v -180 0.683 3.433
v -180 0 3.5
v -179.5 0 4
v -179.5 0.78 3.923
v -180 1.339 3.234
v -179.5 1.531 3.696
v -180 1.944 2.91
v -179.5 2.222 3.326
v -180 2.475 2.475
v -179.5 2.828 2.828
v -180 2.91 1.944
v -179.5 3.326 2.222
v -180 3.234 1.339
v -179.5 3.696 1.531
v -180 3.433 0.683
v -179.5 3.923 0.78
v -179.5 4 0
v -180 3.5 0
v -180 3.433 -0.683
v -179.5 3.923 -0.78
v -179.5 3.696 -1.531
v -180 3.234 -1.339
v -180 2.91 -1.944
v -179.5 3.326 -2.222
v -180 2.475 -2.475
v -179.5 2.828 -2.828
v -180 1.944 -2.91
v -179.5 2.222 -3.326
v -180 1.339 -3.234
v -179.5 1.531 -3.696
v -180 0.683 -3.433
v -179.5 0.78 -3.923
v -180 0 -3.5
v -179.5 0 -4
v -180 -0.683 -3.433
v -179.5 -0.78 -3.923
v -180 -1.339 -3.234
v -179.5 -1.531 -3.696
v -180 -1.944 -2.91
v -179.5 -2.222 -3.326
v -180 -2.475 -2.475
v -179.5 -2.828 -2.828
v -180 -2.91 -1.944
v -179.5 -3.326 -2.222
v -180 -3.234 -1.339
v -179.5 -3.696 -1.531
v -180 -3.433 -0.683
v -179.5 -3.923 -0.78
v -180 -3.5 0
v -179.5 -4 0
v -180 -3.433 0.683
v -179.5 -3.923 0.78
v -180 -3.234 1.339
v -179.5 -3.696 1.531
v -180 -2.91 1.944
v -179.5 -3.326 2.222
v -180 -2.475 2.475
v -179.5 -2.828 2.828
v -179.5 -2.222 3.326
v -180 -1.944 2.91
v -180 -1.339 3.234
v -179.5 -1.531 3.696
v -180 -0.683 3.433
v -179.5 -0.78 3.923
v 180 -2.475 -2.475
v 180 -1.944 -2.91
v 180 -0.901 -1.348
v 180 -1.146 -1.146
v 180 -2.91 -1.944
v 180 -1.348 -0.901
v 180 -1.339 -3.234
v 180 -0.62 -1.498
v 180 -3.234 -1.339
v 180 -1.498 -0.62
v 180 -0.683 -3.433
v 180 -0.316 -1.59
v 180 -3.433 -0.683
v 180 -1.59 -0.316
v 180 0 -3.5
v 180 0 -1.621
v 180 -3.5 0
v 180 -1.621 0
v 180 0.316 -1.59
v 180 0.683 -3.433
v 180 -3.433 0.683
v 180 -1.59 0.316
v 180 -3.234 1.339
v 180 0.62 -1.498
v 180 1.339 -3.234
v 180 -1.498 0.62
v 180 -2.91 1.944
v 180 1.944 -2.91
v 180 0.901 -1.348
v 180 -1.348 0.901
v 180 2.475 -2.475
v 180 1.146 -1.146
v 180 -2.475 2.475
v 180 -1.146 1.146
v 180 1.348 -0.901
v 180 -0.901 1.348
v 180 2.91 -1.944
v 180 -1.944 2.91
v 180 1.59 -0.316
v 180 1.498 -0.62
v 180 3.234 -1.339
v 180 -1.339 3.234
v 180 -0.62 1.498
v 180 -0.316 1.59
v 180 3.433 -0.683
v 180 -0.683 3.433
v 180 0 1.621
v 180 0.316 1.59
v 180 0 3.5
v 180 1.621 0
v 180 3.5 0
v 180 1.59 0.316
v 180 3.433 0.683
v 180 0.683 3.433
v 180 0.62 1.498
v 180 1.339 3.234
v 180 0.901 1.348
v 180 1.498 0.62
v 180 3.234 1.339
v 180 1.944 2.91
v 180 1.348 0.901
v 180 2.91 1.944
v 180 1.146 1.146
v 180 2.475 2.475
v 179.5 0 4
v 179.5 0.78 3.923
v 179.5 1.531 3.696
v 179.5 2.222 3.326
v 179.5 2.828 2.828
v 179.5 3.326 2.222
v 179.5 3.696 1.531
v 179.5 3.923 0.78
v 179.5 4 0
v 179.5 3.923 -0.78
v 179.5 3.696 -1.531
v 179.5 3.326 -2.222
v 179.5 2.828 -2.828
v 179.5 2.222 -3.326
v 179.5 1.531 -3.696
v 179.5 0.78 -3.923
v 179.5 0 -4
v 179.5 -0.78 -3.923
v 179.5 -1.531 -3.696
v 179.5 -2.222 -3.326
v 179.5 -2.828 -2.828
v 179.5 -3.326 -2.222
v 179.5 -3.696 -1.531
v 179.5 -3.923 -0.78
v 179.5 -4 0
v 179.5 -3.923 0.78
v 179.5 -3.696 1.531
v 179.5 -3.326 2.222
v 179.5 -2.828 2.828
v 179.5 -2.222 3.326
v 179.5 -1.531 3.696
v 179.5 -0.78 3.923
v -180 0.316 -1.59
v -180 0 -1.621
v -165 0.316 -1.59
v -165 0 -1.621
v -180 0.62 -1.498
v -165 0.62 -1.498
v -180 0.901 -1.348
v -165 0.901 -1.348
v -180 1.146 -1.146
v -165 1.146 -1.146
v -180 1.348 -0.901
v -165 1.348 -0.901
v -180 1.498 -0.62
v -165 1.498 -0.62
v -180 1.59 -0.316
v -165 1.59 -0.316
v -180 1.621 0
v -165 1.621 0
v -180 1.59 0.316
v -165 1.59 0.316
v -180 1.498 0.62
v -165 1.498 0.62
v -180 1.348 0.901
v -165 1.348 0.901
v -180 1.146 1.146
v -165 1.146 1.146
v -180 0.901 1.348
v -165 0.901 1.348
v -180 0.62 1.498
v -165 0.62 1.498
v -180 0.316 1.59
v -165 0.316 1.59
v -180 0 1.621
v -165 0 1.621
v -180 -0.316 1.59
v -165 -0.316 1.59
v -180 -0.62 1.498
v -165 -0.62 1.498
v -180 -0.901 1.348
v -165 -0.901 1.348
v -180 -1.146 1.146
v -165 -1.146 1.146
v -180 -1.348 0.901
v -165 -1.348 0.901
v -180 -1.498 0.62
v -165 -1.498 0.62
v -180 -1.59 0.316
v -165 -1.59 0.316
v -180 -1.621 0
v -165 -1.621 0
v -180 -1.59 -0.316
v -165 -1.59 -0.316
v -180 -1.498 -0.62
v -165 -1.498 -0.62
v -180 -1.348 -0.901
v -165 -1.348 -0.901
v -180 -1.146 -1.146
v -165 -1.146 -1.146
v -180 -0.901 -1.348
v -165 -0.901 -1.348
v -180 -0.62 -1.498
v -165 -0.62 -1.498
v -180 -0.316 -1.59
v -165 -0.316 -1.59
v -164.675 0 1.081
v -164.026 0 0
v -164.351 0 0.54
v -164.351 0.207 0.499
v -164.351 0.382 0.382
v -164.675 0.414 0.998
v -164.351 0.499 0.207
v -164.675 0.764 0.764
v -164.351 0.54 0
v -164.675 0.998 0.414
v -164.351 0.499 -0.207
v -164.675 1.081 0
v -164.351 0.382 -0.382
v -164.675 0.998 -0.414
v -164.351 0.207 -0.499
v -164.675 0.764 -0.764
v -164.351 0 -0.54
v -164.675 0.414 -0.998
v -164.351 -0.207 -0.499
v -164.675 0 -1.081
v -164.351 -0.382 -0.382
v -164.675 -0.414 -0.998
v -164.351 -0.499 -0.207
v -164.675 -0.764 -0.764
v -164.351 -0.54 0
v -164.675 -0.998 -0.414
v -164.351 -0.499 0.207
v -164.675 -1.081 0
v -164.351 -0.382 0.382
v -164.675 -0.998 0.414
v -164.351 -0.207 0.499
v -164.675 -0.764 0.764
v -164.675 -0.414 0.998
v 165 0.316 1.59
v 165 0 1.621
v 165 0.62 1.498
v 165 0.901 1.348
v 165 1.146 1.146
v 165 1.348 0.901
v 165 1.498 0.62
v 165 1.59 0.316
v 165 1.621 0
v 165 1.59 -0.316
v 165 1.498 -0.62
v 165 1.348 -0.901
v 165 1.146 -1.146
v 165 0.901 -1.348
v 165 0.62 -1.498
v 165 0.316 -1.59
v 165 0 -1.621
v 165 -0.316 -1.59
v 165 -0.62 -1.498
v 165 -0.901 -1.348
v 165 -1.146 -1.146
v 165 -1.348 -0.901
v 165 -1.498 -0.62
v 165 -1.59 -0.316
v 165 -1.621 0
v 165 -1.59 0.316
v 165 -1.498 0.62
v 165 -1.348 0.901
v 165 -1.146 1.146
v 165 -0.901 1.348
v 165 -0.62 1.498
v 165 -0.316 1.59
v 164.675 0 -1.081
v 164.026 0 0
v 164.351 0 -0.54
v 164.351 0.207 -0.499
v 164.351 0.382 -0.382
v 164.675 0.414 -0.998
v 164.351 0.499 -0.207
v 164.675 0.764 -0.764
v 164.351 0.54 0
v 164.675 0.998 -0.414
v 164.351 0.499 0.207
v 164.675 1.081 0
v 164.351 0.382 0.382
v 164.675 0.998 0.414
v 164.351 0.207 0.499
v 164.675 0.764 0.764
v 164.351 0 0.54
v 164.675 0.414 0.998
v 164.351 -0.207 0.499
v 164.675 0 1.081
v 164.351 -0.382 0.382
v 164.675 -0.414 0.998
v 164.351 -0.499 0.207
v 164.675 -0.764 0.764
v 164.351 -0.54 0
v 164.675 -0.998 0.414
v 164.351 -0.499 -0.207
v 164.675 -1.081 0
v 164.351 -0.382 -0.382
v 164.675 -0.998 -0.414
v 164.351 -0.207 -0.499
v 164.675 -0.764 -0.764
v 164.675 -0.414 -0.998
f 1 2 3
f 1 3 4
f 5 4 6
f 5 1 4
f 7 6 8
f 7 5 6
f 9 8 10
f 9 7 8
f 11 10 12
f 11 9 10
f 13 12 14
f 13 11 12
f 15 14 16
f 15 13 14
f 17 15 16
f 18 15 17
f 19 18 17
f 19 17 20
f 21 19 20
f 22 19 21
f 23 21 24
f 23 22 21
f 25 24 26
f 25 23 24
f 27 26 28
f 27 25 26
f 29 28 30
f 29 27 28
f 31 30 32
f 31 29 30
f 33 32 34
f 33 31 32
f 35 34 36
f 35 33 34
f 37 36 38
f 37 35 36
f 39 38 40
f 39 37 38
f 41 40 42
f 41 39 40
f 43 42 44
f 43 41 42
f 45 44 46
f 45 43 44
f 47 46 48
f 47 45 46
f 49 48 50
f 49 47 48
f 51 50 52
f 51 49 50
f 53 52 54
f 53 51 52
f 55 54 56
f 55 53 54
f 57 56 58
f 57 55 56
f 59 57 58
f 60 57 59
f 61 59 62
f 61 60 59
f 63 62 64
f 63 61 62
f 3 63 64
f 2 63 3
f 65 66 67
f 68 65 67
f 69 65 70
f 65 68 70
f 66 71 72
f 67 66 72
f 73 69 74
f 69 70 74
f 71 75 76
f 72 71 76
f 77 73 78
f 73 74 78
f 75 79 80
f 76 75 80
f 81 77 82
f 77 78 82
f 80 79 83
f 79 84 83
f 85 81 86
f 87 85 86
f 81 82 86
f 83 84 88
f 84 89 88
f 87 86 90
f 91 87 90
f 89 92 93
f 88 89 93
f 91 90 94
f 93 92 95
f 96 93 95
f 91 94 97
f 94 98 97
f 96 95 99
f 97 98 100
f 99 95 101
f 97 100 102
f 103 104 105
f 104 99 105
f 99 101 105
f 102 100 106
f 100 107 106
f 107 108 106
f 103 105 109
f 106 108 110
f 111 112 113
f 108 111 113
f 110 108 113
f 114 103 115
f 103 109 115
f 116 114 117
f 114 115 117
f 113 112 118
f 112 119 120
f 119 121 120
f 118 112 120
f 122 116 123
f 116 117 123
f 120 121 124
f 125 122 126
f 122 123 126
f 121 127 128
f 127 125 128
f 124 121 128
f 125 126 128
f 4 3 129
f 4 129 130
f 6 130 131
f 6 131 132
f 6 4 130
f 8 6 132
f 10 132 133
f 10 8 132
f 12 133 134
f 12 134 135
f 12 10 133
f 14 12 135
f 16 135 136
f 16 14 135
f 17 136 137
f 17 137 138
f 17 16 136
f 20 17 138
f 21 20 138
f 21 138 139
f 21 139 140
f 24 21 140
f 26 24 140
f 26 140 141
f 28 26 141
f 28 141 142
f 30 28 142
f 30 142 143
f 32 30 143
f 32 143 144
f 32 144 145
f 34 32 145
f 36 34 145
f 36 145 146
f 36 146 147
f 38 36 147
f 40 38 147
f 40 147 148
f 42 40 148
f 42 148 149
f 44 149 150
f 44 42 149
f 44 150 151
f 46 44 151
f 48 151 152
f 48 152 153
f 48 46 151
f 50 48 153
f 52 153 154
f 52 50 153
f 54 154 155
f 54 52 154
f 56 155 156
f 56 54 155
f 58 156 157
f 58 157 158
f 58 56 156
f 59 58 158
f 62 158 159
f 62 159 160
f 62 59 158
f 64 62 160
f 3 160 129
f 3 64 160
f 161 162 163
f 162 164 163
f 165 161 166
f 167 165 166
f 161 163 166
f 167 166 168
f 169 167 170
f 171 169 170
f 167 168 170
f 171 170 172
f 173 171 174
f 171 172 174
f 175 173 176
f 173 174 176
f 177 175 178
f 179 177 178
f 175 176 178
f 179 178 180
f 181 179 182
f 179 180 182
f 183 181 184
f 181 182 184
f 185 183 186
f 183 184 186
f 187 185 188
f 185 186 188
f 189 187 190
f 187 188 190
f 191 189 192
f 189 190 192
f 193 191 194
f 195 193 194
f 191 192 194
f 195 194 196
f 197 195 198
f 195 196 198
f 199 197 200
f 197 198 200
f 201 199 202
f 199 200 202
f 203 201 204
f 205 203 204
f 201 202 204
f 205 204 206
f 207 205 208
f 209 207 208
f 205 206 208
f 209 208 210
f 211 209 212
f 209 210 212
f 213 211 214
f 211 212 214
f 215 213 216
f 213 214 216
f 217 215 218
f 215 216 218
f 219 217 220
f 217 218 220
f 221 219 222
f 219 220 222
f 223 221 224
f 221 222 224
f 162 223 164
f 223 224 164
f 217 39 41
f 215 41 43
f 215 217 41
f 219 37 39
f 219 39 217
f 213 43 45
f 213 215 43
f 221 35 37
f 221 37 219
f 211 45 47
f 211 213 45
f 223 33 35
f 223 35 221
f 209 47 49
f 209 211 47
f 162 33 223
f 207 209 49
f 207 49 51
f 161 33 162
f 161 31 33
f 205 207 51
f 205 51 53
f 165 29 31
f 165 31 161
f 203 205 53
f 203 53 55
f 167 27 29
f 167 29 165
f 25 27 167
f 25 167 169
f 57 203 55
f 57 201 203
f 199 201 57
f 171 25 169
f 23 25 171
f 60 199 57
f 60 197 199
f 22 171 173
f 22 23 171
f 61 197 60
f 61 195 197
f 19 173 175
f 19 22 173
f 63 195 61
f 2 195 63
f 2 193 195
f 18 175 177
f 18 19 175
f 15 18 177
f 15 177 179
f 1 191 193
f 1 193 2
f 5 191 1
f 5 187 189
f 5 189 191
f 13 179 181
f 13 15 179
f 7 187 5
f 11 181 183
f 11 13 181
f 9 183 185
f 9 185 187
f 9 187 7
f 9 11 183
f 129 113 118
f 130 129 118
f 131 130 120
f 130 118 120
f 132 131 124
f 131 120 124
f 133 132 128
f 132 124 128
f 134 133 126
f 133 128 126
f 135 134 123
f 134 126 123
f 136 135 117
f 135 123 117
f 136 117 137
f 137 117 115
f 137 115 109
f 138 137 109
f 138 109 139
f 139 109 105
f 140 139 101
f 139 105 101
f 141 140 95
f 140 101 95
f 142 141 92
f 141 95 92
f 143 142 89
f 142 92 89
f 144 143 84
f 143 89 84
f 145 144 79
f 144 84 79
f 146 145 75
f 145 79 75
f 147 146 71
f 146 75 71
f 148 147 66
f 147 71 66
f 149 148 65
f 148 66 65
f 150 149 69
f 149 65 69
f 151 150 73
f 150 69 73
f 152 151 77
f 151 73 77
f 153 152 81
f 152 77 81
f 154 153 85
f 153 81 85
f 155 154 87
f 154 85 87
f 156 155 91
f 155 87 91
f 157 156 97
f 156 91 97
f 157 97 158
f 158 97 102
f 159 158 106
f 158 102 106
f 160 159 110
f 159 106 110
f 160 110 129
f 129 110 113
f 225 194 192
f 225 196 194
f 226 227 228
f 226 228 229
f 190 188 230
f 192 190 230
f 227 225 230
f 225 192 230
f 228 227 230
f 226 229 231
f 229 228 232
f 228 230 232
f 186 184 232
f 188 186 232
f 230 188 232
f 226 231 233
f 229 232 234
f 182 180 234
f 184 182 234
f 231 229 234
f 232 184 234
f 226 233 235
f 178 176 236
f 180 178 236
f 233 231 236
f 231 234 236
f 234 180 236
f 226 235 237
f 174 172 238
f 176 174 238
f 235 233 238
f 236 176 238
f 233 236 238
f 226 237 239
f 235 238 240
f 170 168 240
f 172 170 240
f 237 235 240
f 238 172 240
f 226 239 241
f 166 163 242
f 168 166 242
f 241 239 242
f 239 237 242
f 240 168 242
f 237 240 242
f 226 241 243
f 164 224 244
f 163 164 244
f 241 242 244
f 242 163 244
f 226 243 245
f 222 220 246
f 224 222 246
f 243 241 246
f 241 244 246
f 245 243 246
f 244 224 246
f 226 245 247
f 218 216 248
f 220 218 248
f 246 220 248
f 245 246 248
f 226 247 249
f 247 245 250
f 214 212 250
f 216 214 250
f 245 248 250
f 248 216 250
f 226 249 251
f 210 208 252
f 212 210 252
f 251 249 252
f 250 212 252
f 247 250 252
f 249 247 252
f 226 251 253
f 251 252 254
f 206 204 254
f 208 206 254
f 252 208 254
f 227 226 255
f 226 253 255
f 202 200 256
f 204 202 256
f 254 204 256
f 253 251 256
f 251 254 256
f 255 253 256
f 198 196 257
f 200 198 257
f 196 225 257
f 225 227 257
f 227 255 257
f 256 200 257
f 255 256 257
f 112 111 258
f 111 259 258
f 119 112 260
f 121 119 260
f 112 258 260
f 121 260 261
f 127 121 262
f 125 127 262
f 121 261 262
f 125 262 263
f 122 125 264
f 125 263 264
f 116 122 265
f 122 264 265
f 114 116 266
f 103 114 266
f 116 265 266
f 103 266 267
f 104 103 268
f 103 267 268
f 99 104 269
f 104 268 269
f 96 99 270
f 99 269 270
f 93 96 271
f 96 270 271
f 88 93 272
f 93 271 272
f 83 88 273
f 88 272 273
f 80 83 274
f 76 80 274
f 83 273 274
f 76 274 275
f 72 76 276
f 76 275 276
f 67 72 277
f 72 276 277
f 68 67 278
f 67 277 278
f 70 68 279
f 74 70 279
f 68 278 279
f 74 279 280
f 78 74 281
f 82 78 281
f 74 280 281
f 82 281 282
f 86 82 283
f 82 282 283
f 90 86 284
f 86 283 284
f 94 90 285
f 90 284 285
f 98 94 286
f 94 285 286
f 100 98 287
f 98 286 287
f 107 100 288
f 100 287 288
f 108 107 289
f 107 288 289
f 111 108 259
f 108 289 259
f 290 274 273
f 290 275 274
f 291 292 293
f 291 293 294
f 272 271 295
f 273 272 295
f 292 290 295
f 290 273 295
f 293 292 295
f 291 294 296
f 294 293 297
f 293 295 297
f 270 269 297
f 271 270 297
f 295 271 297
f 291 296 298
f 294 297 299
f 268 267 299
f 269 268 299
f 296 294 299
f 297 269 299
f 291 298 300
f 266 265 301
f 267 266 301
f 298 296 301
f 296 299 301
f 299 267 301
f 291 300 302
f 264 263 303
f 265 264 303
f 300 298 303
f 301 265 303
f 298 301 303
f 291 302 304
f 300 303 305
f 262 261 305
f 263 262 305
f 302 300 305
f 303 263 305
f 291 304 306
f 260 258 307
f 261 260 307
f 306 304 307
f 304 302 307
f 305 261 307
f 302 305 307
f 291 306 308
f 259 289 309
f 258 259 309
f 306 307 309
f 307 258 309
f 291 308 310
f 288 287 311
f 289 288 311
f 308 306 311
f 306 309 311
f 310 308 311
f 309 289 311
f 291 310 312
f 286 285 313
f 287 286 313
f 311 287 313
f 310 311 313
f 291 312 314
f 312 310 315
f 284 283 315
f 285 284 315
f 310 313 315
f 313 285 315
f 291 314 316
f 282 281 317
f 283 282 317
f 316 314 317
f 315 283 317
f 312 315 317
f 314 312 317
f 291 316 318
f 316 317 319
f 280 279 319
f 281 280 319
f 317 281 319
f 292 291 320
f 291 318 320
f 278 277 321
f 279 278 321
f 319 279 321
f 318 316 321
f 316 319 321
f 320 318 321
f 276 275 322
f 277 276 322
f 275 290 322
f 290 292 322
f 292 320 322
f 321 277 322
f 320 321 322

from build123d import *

# Parameters (mm, degrees)
SKETCH1_R                = 4
BOSS_EXTRUDE1_DEPTH      = 180
M3_CLEARANCE_HOLE1_D     = 3.242
M3_CLEARANCE_HOLE1_DEPTH = 15
M3_CLEARANCE_HOLE1_TIP   = 0.973995063
M3_CLEARANCE_HOLE2_D     = 3.242
M3_CLEARANCE_HOLE2_DEPTH = 15
M3_CLEARANCE_HOLE2_TIP   = 0.973995063
CHAMFER1_SIZE            = 0.5


with BuildPart() as part:
    # Sketch1 → Boss-Extrude1 (new, symmetric)
    with BuildSketch(Plane(origin=(0, 0, 0), x_dir=(0, -1, 0), z_dir=(-1, 0, 0))):
        with Locations(Location((0, 0, 0), (0, 0, 90))):
            Circle(SKETCH1_R)
    extrude(amount=BOSS_EXTRUDE1_DEPTH, both=True)

    # M3 Clearance Hole1
    with Locations(Plane(origin=(180, 0, 0), x_dir=(0, 0, -1), z_dir=(1, 0, 0))):
        with Locations((0, 0)):
            Hole(M3_CLEARANCE_HOLE1_D / 2, depth=M3_CLEARANCE_HOLE1_DEPTH)
            with Locations((0, 0, -(M3_CLEARANCE_HOLE1_DEPTH + M3_CLEARANCE_HOLE1_TIP / 2))):  # 118° drill point
                Cone(0, M3_CLEARANCE_HOLE1_D / 2, M3_CLEARANCE_HOLE1_TIP, mode=Mode.SUBTRACT)

    # M3 Clearance Hole2
    with Locations(Plane.ZY.offset(180)):
        with Locations((0, 0)):
            Hole(M3_CLEARANCE_HOLE2_D / 2, depth=M3_CLEARANCE_HOLE2_DEPTH)
            with Locations((0, 0, -(M3_CLEARANCE_HOLE2_DEPTH + M3_CLEARANCE_HOLE2_TIP / 2))):  # 118° drill point
                Cone(0, M3_CLEARANCE_HOLE2_D / 2, M3_CLEARANCE_HOLE2_TIP, mode=Mode.SUBTRACT)

    # Chamfer1
    chamfer1_edges = [part.edges().sort_by_distance(p)[0] for p in [
        (-180, 0, -4),
        (180, 0, -4),
    ]]
    chamfer(chamfer1_edges, length=CHAMFER1_SIZE)


solid = part.part
